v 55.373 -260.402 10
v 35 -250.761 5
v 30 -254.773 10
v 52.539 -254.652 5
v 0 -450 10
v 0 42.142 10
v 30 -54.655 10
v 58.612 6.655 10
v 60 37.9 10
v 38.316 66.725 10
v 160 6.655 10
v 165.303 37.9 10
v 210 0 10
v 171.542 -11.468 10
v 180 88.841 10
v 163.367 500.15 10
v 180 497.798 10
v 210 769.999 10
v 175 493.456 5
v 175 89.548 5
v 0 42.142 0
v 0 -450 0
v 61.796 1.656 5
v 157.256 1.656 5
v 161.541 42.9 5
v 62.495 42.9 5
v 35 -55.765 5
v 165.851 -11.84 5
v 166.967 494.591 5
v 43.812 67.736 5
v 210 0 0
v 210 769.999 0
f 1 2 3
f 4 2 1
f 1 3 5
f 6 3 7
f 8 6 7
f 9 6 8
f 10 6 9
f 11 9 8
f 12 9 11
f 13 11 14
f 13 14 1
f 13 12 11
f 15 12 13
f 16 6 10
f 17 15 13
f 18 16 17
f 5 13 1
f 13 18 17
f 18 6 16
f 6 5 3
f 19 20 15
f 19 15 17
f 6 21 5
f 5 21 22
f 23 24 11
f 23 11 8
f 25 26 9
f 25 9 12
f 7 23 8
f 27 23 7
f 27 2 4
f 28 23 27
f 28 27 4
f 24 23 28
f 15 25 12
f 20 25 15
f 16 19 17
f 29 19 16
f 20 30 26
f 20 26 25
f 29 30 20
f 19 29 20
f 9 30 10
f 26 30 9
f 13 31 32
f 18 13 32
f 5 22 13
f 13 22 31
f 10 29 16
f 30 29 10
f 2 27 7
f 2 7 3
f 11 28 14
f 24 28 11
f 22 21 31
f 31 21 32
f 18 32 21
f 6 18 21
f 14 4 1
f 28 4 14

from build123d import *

# Parameters (mm, degrees)
BOSS_EXTRU_1_DEPTH      = 10
ENL_V_MAT_EXTRU_1_DEPTH = 5
CHANFREIN1_SIZE         = 5


with BuildPart() as part:
    # Esquisse1 → Boss.-Extru.1 (new body)
    with BuildSketch(Plane.XY):
        Polygon((0, 0), (0, -450), (210, 0), (210, 727.857142857), (210, 769.998850412), (0, 42.141707555), align=None)
    extrude(amount=BOSS_EXTRU_1_DEPTH)

    # Esquisse2 → Enlèv. mat.-Extru.1 (cut)
    with BuildSketch(Plane.XY.offset(10)):
        Polygon((60, 37.900434867), (165.302631408, 37.900434867), (180, 88.841314442), (180, 497.798394051), (163.367347804, 500.149847834), (38.316326098, 66.724707975), align=None)
        Polygon((58.611734047, 6.655480102), (30, -54.655378569), (30, -254.773091326), (55.37312792, -260.402102926), (171.542290693, -11.468182697), (160, 6.655480102), align=None)
    extrude(amount=-ENL_V_MAT_EXTRU_1_DEPTH, mode=Mode.SUBTRACT)

    # Chanfrein1
    chanfrein1_edges = [part.edges().sort_by_distance(p)[0] for p in [
        (165.771145347, -2.406351297, 5),
        (113.457709307, -135.935142812, 5),
        (42.68656396, -257.587597126, 5),
        (30, -154.714234948, 5),
        (44.305867023, -23.999949233, 5),
        (109.305867023, 6.655480102, 5),
        (171.683673902, 498.974120942, 5),
        (180, 293.319854246, 5),
        (172.651315704, 63.370874655, 5),
        (112.651315704, 37.900434867, 5),
        (49.158163049, 52.312571421, 5),
        (100.841836951, 283.437277905, 5),
    ]]
    chamfer(chanfrein1_edges, length=CHANFREIN1_SIZE - 0.0001)  # a hair under: the kernel refuses the full size


solid = part.part
